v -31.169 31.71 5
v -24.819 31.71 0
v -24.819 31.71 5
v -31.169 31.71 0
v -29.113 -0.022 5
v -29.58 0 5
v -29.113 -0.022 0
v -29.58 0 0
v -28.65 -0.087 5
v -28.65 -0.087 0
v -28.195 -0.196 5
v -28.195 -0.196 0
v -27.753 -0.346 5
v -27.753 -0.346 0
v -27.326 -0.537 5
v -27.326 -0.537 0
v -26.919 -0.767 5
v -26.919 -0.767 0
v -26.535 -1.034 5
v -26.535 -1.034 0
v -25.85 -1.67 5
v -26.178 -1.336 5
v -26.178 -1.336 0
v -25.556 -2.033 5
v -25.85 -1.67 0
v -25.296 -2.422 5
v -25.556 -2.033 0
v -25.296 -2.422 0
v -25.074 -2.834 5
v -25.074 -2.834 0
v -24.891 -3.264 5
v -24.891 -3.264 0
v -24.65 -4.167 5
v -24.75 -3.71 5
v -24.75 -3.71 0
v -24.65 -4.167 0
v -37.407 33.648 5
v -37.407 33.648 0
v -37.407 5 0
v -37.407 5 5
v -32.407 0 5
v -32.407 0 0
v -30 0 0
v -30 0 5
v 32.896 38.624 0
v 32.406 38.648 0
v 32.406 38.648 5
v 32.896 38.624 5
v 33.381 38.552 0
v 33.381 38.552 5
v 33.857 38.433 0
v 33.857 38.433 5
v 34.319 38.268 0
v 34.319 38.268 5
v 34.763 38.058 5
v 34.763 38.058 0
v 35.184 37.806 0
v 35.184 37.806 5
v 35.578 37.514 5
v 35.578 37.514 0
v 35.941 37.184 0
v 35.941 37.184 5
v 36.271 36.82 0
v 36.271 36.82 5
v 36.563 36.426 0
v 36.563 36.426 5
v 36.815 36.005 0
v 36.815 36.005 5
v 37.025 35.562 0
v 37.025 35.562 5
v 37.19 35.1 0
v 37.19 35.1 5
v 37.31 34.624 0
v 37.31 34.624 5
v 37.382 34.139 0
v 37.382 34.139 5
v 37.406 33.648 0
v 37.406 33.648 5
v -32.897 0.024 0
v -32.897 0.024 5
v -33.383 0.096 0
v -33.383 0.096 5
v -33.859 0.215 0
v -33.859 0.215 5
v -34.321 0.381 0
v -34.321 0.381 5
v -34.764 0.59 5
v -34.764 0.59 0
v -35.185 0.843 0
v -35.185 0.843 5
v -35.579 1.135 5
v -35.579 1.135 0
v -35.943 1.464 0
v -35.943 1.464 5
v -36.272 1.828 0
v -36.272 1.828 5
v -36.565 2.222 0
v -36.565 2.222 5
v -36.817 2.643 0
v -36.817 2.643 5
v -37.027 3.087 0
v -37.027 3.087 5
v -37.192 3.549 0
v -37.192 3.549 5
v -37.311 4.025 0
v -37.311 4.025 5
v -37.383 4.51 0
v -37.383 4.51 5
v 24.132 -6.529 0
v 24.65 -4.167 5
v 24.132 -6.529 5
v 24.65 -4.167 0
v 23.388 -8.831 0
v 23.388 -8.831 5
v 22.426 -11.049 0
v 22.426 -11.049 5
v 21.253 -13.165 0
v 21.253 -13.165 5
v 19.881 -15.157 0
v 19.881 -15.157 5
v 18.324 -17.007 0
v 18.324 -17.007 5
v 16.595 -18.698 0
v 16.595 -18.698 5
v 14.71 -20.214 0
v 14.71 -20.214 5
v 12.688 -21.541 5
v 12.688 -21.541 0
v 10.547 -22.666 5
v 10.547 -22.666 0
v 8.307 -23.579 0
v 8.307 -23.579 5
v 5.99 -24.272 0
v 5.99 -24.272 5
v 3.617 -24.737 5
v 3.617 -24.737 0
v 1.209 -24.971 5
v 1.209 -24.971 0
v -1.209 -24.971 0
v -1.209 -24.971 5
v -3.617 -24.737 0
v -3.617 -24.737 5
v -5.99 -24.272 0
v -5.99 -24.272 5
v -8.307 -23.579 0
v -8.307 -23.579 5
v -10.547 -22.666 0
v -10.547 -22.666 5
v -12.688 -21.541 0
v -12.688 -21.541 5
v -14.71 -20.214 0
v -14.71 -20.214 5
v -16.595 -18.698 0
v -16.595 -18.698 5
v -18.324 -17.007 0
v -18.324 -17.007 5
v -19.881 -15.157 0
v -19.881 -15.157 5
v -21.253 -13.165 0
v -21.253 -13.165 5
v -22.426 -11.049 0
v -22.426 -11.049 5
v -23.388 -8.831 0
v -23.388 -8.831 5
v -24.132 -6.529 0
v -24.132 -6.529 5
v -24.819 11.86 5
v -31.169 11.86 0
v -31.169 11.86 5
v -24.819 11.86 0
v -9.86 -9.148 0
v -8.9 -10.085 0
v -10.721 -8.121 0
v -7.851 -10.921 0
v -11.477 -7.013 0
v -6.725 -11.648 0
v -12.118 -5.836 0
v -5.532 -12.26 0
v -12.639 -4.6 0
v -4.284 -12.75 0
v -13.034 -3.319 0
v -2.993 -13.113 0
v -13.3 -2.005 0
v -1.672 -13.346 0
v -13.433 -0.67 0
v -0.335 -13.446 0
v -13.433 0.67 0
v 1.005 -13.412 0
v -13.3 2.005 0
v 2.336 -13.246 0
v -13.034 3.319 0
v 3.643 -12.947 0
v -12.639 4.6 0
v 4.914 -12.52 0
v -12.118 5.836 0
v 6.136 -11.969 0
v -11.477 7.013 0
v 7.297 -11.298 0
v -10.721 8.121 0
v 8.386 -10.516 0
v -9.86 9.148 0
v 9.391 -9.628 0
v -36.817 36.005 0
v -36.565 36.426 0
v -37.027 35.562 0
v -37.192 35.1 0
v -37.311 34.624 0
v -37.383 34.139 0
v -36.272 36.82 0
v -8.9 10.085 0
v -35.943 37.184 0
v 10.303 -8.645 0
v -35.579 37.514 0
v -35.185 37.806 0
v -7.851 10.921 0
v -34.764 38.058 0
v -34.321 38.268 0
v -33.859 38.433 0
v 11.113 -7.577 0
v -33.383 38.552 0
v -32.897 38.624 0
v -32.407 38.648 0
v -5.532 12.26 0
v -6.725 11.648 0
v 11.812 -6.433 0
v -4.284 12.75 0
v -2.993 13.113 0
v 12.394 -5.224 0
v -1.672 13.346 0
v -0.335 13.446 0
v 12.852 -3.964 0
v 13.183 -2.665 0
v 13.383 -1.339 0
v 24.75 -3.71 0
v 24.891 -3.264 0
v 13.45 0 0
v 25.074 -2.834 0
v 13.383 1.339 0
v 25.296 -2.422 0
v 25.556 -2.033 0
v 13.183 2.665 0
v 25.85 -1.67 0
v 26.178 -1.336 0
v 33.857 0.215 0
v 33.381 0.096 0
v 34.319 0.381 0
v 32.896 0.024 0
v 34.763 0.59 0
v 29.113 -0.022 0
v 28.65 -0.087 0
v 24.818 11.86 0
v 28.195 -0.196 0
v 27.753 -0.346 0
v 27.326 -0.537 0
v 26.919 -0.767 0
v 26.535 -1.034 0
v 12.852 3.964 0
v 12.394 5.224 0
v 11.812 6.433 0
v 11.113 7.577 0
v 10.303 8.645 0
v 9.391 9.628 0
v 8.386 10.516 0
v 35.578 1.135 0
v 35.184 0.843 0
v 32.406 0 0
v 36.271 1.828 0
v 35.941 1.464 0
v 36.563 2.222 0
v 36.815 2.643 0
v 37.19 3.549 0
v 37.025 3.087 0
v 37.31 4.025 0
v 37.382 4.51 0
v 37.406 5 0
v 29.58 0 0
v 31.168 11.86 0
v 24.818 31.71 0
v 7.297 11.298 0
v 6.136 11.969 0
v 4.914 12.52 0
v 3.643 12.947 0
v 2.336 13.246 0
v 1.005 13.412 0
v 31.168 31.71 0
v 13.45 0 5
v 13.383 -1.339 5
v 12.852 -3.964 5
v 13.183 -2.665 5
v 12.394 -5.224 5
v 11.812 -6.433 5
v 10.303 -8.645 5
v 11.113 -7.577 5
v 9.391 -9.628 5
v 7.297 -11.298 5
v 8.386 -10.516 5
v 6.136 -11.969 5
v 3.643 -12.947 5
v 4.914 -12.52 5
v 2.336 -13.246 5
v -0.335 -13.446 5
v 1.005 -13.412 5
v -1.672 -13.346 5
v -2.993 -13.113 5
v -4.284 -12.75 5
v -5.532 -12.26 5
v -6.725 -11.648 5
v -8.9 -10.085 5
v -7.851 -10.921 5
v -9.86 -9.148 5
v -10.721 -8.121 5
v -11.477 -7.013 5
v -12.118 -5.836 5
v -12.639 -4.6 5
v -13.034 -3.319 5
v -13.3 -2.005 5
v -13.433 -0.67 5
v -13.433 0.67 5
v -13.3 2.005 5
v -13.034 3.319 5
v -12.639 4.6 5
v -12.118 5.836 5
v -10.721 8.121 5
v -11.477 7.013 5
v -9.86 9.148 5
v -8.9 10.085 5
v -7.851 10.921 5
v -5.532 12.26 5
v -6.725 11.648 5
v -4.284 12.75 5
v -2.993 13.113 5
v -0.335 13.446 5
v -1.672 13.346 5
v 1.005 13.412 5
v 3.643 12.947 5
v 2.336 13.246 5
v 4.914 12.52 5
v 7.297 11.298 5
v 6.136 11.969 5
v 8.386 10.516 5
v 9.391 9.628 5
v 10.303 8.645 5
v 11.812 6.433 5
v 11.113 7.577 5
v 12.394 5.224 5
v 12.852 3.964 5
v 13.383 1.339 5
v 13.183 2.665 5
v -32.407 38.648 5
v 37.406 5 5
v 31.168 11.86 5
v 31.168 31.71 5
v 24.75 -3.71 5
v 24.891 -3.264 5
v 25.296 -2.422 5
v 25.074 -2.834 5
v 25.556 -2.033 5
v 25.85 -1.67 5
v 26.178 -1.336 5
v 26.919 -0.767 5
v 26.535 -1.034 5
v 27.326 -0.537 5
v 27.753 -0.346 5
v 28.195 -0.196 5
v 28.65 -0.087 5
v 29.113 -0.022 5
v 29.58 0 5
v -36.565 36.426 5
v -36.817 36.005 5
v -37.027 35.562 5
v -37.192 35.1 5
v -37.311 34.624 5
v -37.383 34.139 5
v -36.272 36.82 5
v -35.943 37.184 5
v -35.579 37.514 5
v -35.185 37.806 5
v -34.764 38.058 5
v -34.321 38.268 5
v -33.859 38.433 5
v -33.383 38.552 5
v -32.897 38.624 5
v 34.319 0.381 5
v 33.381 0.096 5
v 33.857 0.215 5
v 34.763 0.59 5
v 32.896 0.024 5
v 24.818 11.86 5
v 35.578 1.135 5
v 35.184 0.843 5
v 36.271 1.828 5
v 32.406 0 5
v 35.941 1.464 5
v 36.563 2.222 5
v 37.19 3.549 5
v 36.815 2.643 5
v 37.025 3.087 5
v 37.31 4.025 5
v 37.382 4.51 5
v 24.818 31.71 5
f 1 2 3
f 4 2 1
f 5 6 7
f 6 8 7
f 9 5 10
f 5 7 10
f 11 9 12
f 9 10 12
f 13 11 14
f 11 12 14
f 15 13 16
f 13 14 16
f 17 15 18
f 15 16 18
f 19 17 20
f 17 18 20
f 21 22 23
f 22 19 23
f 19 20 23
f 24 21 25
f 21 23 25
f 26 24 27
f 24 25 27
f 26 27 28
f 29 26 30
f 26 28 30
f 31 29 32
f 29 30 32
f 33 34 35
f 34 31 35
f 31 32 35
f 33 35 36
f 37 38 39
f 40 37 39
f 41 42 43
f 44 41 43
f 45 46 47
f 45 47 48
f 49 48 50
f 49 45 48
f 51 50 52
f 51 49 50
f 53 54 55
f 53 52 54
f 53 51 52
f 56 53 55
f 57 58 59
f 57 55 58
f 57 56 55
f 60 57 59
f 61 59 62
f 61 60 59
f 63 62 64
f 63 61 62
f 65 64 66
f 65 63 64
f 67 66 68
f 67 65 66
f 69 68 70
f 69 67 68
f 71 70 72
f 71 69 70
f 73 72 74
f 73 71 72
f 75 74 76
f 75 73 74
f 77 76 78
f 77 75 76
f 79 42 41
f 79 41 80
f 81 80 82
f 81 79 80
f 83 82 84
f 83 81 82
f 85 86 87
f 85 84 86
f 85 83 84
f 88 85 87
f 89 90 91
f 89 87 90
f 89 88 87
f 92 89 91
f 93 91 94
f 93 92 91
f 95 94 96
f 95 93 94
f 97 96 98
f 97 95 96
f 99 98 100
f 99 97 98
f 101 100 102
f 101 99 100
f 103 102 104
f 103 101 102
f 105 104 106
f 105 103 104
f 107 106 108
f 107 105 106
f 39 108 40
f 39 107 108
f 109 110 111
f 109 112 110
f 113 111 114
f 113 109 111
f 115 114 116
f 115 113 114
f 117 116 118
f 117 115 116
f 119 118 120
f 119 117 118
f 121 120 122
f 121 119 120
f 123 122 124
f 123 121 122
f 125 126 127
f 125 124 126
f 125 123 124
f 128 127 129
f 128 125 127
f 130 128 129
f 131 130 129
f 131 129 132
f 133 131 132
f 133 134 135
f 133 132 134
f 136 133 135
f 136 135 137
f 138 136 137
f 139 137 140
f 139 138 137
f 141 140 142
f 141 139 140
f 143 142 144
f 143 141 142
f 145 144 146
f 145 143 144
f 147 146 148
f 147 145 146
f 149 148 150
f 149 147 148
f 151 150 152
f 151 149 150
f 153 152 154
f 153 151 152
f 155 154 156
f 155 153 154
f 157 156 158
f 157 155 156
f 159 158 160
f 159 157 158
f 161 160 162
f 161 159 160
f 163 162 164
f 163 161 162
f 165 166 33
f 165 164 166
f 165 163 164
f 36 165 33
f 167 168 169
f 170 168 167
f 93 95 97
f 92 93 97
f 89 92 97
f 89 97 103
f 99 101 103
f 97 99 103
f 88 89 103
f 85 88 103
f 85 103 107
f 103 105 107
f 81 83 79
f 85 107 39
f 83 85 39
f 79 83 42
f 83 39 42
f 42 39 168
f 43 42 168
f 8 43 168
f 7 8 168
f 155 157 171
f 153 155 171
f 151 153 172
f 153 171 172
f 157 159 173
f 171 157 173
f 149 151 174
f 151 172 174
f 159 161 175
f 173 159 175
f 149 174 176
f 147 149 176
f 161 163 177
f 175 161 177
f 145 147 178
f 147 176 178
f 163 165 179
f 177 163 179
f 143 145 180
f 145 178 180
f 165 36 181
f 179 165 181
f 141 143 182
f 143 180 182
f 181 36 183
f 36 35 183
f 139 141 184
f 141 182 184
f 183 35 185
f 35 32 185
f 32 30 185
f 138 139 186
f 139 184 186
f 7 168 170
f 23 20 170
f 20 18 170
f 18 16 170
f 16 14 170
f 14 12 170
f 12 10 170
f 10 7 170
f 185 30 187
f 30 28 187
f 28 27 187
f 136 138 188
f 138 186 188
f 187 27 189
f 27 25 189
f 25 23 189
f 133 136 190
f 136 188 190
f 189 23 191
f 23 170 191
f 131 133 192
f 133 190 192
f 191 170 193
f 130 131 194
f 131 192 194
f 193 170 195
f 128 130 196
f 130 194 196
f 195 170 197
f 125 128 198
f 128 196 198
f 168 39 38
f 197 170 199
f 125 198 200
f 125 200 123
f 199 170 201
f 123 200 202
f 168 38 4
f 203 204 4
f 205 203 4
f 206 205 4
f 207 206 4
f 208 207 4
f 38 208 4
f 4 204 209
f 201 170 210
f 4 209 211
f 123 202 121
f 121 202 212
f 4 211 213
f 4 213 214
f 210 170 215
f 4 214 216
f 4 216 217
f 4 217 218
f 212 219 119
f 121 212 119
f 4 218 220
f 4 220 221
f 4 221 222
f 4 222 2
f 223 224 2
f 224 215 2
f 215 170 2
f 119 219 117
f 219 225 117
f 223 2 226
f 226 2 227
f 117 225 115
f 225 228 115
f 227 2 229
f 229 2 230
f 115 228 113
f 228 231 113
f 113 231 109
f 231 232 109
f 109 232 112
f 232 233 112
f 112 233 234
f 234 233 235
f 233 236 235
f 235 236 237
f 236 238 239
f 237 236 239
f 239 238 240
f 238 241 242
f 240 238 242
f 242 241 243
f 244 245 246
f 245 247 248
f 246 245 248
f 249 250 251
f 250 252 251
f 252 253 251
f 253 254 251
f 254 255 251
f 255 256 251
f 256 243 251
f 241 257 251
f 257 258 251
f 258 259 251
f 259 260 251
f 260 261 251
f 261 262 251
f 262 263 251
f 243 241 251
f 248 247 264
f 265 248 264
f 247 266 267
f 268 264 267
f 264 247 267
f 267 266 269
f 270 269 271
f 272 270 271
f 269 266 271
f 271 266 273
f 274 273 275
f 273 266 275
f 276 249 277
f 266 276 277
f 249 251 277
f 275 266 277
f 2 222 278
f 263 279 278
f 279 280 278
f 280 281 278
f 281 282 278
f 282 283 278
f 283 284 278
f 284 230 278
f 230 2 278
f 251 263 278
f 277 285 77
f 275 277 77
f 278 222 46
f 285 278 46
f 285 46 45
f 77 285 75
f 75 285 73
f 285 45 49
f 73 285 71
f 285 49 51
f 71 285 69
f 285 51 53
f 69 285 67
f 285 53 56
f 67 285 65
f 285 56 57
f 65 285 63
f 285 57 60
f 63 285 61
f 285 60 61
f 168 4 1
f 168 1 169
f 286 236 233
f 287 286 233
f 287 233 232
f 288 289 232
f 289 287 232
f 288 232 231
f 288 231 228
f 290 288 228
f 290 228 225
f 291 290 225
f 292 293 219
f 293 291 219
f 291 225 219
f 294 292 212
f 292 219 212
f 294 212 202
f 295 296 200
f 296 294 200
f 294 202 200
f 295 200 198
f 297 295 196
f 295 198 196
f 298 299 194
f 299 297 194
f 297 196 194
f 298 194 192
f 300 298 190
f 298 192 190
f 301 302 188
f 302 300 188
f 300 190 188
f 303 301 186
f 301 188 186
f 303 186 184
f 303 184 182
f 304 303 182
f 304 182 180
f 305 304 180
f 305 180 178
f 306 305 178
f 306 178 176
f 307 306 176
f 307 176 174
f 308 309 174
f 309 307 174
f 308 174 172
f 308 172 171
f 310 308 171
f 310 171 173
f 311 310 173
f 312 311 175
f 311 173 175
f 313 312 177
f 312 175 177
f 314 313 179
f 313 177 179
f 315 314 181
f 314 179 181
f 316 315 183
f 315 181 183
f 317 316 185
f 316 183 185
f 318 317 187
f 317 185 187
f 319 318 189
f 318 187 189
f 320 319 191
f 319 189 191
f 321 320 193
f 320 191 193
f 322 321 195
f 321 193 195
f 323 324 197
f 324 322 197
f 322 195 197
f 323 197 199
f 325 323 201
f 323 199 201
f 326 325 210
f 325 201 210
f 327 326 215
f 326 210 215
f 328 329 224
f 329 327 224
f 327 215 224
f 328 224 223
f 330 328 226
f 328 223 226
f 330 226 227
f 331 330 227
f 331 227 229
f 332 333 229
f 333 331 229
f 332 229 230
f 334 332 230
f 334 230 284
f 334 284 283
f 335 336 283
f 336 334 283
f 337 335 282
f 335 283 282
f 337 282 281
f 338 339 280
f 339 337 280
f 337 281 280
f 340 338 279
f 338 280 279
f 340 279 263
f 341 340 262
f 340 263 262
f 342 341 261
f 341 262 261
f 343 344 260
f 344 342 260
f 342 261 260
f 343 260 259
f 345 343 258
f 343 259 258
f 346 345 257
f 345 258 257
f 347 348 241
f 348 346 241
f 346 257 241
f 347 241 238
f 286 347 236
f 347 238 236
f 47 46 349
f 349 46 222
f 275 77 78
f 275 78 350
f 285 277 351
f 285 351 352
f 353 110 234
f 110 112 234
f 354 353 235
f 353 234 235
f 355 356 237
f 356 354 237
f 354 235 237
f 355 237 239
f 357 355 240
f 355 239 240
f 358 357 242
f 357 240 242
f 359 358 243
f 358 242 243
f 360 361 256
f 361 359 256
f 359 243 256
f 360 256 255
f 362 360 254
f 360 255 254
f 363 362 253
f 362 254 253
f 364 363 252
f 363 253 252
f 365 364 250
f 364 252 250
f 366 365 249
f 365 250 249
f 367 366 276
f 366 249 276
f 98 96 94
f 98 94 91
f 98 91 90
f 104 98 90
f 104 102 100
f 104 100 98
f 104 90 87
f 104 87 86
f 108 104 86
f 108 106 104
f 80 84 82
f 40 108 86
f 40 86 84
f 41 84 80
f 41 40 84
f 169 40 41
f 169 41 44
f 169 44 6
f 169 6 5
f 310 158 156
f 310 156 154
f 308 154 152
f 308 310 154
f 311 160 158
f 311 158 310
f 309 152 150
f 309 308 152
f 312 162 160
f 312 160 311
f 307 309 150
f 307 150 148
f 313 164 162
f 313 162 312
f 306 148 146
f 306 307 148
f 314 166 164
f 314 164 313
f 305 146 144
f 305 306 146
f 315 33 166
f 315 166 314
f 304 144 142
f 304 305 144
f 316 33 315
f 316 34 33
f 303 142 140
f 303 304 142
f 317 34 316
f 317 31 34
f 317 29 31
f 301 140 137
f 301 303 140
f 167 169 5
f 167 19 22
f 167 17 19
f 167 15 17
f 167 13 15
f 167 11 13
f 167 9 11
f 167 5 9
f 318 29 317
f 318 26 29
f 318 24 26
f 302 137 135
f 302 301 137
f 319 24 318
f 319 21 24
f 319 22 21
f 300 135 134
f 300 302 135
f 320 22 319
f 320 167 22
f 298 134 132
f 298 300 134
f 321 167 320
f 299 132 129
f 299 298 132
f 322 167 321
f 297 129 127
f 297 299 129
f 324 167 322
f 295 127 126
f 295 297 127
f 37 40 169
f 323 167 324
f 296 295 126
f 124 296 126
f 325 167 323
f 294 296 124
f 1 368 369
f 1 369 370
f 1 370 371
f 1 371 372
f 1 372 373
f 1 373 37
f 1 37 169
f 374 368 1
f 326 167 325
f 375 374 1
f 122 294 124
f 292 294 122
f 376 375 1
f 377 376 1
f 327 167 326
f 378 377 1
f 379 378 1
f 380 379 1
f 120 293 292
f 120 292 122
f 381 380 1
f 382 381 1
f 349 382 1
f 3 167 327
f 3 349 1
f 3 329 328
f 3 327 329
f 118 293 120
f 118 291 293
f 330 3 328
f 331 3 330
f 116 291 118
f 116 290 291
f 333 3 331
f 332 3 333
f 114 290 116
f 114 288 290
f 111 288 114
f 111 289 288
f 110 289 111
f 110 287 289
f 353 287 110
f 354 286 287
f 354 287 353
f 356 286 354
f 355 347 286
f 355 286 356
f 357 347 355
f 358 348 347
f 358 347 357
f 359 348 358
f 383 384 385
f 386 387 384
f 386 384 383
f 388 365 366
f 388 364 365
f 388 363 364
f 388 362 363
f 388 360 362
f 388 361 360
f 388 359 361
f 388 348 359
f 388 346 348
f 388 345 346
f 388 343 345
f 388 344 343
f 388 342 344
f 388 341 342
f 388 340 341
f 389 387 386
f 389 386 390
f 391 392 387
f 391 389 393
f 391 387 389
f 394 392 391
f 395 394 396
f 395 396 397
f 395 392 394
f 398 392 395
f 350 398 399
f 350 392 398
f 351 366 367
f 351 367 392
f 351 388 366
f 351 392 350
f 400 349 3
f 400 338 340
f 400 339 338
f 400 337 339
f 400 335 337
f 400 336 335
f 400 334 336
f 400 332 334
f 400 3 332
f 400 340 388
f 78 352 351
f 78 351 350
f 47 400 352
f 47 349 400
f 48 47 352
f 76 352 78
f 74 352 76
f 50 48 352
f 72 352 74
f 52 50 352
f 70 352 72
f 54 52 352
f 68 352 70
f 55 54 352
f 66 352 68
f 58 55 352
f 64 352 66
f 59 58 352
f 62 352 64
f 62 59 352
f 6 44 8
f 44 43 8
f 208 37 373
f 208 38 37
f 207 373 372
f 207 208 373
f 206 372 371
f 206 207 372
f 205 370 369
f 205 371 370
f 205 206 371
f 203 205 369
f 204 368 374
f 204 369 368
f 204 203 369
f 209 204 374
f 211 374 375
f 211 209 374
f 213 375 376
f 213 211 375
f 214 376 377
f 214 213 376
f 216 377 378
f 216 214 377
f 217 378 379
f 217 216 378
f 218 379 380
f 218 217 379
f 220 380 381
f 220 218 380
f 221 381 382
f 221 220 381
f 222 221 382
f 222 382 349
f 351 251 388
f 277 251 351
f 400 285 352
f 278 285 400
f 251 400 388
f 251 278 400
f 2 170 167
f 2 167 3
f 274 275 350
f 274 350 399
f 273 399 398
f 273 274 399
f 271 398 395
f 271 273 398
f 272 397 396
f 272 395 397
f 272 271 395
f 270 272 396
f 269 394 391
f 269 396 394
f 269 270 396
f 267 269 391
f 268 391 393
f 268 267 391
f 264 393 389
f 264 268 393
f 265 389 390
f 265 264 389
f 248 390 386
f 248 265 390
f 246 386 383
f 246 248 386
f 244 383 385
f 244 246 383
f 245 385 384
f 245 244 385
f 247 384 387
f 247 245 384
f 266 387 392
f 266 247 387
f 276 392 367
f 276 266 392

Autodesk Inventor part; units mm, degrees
ref_plane "YZ Plane" through (0, 0, 0) normal (1, 0, 0) x (0, 1, 0)
ref_plane "XZ Plane" through (0, 0, 0) normal (0, 1, 0) x (-1, 0, 0)
ref_plane "XY Plane" through (0, 0, 0) normal (0, 0, 1) x (1, 0, 0)
sketch "Эскиз1" plane through (0, 0, 0) normal (0, 0, 1) x (1, 0, 0)
  line L0 (32.4057, 38.6485) -> (-32.4072, 38.6485)
  arc A0 (-32.4072, 38.6485) -> (-37.4072, 33.6485) centre (-32.4072, 33.6485) ccw
  line L1 (-37.4072, 33.6485) -> (-37.4072, 5)
  arc A1 (-37.4072, 5) -> (-32.4072, 0) centre (-32.4072, 5) ccw
  line L2 (-30, 0) -> (-29.5804, 0)
  arc A2 (-24.6503, -4.1667) -> (-29.5804, 0) centre (-29.5804, -5) ccw
  arc A3 (-24.6503, -4.1667) -> (24.6503, -4.1667) centre (0, 0) ccw
  arc A4 (29.5804, 0) -> (24.6503, -4.1667) centre (29.5804, -5) ccw
  circle A5 centre (0, 0) radius 13.45
  line L3 (-0.0007, 35) -> (-0.0007, -40.0249) construction
  line L4 (-31.1692, 11.8598) -> (-24.8192, 11.8598)
  line L5 (-24.8192, 11.8598) -> (-24.8192, 31.7098)
  line L6 (-24.8192, 31.7098) -> (-31.1692, 31.7098)
  line L7 (-31.1692, 31.7098) -> (-31.1692, 11.8598)
  line L8 (24.8177, 11.8598) -> (31.1677, 11.8598)
  line L9 (31.1677, 11.8598) -> (31.1677, 31.7098)
  line L10 (31.1677, 31.7098) -> (24.8177, 31.7098)
  line L11 (24.8177, 31.7098) -> (24.8177, 11.8598)
  arc A6 (37.4057, 33.6485) -> (32.4057, 38.6485) centre (32.4057, 33.6485) ccw
  line L12 (37.4057, 33.6485) -> (37.4057, 5)
  arc A7 (32.4057, 0) -> (37.4057, 5) centre (32.4057, 5) ccw
  line L13 (32.4057, 0) -> (29.5804, 0)
  line L14 (-32.4072, 0) -> (-30, 0)
  point P0 (29.9986, 30)
  point P1 (-30, 30)
  point P2 (25.9869, 30)
extrude "Выдавливание1" add sketch "Эскиз1" along normal blind 5
properties part number "Гор. шарнир"
